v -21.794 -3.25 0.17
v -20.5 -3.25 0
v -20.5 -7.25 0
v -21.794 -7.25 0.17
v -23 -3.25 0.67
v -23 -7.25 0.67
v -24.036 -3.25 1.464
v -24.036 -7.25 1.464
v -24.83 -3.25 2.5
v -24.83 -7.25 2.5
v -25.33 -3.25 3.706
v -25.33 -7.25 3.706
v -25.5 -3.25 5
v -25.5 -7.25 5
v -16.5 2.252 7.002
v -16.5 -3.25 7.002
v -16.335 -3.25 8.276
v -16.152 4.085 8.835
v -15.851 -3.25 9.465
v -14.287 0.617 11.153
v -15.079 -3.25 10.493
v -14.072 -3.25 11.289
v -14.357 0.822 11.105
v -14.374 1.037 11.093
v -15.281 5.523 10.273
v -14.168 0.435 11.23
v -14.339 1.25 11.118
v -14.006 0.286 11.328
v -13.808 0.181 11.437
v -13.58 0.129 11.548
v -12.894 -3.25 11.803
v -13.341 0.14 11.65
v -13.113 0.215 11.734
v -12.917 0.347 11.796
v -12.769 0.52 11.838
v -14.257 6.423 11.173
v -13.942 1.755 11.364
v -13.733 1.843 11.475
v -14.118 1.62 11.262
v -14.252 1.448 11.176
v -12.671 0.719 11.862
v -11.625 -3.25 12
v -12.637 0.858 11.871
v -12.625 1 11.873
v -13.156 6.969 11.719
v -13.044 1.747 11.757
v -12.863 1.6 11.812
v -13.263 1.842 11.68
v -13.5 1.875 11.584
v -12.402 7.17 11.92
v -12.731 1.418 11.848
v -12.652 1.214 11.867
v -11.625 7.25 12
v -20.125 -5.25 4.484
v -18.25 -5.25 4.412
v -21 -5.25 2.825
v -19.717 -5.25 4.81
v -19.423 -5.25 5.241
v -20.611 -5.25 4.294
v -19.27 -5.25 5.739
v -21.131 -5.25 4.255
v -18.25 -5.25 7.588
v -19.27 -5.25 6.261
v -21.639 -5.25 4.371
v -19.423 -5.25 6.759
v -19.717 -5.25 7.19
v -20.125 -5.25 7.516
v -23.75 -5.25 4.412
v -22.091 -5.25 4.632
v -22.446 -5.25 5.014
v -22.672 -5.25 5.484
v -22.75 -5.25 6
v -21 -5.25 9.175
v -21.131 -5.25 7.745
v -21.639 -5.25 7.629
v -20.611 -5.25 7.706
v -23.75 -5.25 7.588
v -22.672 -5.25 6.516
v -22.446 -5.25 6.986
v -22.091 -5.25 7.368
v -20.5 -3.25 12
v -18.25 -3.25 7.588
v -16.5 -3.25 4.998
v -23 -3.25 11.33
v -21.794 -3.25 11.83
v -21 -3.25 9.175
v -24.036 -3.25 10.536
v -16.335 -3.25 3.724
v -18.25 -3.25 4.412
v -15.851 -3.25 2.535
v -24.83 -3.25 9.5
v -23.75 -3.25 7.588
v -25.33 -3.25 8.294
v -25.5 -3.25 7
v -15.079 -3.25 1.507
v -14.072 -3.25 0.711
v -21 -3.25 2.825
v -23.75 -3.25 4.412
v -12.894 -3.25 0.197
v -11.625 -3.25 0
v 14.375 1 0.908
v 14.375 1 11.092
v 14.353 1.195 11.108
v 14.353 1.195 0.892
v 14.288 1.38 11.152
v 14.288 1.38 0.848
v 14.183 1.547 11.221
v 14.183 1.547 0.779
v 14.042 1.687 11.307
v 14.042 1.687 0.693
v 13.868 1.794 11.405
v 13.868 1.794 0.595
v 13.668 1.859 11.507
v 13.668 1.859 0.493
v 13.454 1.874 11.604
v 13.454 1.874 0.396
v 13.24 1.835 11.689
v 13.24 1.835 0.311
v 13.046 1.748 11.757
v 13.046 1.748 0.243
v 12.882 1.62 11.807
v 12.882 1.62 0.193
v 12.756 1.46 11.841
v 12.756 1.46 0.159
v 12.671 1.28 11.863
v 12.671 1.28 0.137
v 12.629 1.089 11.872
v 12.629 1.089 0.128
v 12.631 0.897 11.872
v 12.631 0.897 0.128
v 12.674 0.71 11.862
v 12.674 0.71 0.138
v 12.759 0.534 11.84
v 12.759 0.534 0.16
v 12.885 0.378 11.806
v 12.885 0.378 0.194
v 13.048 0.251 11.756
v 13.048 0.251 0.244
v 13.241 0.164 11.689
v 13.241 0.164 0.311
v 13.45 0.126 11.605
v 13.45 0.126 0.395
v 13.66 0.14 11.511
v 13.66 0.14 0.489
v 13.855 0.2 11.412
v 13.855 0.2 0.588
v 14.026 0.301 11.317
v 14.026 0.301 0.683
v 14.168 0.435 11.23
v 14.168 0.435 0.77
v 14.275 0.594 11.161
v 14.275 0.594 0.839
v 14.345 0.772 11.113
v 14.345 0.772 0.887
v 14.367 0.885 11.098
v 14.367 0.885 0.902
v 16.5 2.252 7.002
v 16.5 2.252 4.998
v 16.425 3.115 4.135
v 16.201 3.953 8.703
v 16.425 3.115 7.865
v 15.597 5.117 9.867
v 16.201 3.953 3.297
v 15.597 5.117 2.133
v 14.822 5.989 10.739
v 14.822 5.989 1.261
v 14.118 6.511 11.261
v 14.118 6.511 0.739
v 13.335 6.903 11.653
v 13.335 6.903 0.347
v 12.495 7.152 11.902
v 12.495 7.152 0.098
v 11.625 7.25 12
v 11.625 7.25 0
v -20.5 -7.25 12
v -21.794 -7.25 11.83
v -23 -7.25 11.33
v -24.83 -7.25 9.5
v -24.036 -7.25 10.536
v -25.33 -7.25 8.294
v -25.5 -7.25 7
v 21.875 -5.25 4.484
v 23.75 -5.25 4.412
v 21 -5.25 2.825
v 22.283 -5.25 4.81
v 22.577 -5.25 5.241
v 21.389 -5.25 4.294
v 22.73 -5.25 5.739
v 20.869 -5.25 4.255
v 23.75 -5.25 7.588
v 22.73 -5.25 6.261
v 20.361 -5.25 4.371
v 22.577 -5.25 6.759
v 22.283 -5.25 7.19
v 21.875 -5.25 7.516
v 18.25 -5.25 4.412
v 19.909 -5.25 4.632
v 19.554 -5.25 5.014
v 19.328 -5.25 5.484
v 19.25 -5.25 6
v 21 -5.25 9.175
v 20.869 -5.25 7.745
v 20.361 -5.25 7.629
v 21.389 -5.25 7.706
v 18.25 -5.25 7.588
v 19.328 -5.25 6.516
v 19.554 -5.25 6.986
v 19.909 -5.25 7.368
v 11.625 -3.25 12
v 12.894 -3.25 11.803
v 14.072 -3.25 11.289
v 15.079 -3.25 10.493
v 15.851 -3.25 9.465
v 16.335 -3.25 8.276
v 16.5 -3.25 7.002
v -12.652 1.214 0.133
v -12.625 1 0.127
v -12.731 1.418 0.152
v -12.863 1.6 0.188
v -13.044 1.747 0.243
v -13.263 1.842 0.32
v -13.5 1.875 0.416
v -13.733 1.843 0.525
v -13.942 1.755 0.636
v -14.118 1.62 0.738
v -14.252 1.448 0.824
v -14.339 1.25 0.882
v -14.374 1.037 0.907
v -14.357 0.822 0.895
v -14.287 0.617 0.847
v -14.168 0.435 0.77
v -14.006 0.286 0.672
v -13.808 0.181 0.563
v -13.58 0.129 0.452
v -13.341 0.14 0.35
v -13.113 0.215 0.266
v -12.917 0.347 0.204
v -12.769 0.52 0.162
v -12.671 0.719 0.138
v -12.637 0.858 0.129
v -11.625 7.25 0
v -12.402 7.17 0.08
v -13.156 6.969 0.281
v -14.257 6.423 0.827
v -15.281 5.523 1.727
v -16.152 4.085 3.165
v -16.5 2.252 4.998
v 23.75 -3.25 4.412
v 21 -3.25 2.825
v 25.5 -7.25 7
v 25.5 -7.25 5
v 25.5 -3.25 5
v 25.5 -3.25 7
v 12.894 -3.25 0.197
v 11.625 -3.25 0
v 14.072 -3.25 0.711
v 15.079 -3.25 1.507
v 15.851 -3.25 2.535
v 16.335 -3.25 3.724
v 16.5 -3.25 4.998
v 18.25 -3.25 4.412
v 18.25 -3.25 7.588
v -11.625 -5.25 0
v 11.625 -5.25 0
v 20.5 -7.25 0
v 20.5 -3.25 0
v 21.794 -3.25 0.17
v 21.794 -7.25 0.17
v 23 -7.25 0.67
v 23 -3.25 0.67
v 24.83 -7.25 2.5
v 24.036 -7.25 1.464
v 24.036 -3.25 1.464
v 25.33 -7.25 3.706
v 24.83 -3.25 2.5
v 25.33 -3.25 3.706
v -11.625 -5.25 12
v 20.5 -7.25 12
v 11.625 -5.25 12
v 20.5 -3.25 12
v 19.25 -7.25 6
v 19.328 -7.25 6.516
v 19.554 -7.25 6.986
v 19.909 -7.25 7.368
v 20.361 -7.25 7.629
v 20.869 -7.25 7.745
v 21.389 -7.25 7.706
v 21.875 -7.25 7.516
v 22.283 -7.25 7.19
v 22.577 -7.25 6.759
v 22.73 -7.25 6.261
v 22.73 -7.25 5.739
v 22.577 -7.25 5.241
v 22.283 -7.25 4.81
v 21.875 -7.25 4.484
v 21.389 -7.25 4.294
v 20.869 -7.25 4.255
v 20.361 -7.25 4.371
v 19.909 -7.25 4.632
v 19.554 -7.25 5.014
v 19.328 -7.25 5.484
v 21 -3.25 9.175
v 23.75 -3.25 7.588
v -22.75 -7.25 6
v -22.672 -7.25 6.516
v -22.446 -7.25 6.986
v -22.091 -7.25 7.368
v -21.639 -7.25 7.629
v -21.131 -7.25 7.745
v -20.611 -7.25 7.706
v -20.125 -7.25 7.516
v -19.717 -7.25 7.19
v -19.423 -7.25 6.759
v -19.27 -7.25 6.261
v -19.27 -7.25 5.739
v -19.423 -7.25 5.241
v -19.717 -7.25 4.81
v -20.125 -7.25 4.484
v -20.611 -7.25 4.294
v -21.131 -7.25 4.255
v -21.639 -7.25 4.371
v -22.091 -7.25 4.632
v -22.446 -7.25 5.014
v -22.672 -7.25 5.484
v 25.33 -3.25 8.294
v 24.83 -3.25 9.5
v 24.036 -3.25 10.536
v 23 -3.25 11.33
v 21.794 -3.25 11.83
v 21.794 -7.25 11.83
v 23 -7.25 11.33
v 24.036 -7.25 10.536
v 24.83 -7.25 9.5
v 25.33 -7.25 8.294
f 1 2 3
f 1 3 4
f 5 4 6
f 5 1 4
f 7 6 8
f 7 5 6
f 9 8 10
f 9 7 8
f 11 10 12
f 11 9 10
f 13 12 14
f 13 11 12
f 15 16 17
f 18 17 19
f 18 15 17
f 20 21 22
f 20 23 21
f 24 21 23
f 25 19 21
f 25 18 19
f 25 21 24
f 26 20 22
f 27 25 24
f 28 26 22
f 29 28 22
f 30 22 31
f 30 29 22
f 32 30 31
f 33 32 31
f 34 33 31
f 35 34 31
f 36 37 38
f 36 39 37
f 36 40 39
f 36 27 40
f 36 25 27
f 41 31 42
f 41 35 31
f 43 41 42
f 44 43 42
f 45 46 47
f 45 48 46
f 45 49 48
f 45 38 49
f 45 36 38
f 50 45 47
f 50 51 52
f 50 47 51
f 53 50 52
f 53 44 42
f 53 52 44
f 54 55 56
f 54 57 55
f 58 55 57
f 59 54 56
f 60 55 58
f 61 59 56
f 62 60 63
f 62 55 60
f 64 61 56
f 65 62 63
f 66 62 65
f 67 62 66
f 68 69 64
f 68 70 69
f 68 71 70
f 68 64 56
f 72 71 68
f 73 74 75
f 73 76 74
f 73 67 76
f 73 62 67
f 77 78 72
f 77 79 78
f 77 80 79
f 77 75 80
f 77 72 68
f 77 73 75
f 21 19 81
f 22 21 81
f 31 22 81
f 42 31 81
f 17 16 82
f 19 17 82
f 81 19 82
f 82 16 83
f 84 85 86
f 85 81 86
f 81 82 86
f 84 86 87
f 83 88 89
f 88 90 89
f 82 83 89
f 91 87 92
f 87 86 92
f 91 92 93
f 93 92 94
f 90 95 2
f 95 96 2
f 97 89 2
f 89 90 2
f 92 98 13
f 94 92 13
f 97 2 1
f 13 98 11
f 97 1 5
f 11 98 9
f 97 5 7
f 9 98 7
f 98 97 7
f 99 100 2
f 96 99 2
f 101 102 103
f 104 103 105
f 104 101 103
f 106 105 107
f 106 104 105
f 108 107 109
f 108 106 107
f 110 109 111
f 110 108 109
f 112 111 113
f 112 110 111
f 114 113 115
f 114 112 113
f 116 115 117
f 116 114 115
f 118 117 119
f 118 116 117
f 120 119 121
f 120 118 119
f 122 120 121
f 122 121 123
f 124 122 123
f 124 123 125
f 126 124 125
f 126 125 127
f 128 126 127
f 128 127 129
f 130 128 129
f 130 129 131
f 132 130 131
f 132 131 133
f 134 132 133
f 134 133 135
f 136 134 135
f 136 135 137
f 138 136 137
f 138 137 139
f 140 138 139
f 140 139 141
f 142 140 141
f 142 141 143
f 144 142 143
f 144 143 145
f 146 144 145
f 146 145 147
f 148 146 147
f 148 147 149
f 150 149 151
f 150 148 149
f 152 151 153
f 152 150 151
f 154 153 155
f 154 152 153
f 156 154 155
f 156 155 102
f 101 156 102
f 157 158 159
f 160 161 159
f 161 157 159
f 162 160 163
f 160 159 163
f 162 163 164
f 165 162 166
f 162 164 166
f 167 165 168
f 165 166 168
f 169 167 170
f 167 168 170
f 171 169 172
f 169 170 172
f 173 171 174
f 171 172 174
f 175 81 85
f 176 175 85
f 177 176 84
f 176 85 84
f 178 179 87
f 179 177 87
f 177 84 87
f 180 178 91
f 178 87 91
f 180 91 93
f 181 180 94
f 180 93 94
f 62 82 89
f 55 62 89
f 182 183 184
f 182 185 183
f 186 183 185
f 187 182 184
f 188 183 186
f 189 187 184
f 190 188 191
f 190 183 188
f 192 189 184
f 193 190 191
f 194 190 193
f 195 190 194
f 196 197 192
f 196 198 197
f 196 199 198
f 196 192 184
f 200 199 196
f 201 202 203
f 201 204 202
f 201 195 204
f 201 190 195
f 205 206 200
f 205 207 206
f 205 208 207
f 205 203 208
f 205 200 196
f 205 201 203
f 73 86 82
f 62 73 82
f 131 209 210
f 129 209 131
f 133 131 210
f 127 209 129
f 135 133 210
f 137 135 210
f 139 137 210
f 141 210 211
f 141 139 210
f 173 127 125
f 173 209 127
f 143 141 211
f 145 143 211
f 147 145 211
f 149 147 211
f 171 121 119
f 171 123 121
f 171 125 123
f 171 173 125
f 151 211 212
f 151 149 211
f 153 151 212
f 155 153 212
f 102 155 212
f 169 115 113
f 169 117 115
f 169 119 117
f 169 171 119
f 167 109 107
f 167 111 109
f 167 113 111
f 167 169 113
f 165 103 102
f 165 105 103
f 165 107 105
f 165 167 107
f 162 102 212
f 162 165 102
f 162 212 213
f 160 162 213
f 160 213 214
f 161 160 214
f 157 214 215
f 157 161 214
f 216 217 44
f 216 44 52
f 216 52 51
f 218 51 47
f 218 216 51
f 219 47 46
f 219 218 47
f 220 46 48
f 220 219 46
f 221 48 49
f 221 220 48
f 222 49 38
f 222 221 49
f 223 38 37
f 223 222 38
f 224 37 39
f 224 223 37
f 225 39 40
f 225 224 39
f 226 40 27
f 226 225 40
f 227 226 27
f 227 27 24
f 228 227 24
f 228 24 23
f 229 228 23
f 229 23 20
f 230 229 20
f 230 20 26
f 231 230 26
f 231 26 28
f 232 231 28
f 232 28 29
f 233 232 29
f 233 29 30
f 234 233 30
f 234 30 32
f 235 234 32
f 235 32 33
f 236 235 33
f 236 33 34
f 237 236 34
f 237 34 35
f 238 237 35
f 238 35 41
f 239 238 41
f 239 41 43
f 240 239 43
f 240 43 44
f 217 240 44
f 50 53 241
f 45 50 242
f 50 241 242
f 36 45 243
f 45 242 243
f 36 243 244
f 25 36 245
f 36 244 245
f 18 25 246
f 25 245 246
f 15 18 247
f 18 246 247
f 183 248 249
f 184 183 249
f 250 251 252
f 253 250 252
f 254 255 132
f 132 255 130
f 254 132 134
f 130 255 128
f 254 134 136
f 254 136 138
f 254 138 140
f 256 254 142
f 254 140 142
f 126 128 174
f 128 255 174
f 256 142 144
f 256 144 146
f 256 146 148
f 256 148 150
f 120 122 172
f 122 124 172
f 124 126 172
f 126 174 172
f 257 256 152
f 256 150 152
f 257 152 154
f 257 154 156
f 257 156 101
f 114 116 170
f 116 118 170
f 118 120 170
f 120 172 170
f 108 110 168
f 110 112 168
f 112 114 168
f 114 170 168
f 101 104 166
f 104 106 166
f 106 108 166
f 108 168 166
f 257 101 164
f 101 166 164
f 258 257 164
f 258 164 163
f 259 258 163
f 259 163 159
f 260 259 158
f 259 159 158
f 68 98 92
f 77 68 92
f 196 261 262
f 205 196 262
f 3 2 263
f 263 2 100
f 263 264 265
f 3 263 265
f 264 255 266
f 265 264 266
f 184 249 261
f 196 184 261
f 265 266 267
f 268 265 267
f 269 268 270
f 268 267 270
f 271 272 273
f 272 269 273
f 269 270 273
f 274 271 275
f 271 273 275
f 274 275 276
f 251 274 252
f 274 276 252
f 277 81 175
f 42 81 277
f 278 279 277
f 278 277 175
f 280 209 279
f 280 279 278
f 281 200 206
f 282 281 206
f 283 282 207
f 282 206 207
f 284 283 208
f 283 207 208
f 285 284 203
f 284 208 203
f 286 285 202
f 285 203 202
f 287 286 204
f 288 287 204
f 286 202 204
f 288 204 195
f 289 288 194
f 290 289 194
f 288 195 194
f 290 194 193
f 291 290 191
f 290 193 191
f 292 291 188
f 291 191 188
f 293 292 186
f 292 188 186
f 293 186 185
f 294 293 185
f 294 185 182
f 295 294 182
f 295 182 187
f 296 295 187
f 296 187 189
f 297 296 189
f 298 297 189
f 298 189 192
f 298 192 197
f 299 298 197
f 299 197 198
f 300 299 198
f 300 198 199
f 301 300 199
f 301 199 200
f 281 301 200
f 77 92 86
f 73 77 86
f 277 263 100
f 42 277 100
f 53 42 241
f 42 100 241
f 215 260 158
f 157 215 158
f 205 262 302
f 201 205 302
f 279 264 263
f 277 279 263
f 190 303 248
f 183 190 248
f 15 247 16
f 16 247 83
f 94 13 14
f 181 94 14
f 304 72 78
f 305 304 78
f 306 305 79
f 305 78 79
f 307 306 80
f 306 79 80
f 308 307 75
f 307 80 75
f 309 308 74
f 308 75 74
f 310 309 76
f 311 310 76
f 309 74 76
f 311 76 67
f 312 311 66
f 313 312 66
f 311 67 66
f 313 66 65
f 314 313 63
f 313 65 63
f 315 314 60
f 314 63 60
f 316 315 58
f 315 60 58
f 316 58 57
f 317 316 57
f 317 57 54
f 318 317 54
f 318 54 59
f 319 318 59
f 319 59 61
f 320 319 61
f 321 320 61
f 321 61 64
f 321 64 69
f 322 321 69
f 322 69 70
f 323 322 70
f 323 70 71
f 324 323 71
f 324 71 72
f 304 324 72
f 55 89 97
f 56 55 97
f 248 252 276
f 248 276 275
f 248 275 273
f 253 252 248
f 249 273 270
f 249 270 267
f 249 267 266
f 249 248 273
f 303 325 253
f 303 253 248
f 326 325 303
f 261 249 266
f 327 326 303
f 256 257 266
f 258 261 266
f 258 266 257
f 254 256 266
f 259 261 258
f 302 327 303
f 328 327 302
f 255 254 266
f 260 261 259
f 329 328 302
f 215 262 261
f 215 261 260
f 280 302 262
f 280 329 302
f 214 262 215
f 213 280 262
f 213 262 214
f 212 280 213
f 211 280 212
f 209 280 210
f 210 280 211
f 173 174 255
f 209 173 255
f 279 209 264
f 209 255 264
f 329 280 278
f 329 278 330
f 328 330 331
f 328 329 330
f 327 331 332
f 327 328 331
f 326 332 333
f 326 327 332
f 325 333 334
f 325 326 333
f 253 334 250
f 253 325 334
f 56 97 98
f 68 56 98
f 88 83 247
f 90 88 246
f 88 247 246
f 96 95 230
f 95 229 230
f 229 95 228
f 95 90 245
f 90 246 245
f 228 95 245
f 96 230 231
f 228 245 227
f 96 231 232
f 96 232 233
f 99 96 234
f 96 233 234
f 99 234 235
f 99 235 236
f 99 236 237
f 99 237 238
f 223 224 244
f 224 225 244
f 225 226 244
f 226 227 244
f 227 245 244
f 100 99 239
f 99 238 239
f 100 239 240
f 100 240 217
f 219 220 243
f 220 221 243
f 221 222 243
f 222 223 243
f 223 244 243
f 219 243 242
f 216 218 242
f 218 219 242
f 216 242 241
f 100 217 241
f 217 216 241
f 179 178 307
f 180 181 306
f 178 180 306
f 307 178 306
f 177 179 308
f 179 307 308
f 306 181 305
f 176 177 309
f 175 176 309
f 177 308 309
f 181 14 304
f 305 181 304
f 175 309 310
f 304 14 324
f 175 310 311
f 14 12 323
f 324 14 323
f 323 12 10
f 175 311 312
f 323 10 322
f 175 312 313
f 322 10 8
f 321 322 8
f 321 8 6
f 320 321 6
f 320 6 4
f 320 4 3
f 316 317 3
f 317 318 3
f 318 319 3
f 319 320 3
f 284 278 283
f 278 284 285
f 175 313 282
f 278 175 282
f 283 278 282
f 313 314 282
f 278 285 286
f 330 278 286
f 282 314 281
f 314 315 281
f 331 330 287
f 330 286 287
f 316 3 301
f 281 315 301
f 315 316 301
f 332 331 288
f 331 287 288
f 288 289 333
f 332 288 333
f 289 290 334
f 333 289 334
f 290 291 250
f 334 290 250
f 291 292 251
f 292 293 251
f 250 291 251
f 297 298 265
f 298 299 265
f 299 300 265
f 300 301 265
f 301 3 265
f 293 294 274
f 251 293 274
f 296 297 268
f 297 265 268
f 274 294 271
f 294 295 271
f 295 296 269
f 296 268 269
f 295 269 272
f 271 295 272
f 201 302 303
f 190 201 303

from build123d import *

# Parameters (mm, degrees)
F0_R        = 0.875
F1_DEPTH    = 12
F2_R        = 1.75
F3_DEPTH    = 25
F4_DEPTH    = 2
F5_T1_DEPTH = 36.9921862789
F5_T3_DEPTH = 29
F5_T5_DEPTH = 22.9960931395


# Not quite as in the source:
# - a fillet or chamfer that OpenCascade refuses, or shapes differently, is made with other operations: its cross-section is extruded or revolved along the edge and cut away or added


with BuildPart() as f1:
    # F0 (on Top) → F1 (new body)
    with BuildSketch(Plane.XY):
        Polygon((-11.625, 7.25), (-16.5, 7.25), (-16.5, -3.25), (-16.5, -5.25), (-11.625, -5.25), align=None)
        with Locations((-13.5, 1)):
            Circle(F0_R, mode=Mode.SUBTRACT)
        Polygon((-16.5, -5.25), (-16.5, -3.25), (-25.5, -3.25), (-25.5, -7.25), (-16.5, -7.25), align=None)
        Polygon((11.625, -5.25), (-11.625, -5.25), (-16.5, -5.25), (-16.5, -7.25), (16.5, -7.25), (16.5, -5.25), align=None)
        Polygon((25.5, -3.25), (16.5, -3.25), (16.5, -5.25), (16.5, -7.25), (25.5, -7.25), align=None)
        Polygon((16.5, 7.25), (11.625, 7.25), (11.625, -5.25), (16.5, -5.25), (16.5, -3.25), align=None)
        with Locations((13.5, 1)):
            Circle(F0_R, mode=Mode.SUBTRACT)
    extrude(amount=F1_DEPTH)

    # F2 (on face) → F3 (cut)
    with BuildSketch(Plane(origin=(0, -3.25, 0), x_dir=(-1, 0, 0), z_dir=(0, 1, 0))):
        with Locations((-21, 6)):
            Circle(F2_R)
        with Locations((21, 6)):
            Circle(F2_R)
    extrude(amount=-F3_DEPTH, mode=Mode.SUBTRACT)

    # F2 (on face) → F4 (cut)
    with BuildSketch(Plane(origin=(0, -3.25, 0), x_dir=(-1, 0, 0), z_dir=(0, 1, 0))):
        Polygon((-23.75, 7.5877132403), (-23.75, 4.4122867597), (-21, 2.8245735195), (-18.25, 4.4122867597), (-18.25, 7.5877132403), (-21, 9.1754264805), align=None)
        with Locations((-21, 6)):
            Circle(F2_R, mode=Mode.SUBTRACT)
        Polygon((23.75, 4.4122867597), (23.75, 7.5877132403), (21, 9.1754264805), (18.25, 7.5877132403), (18.25, 4.4122867597), (21, 2.8245735195), align=None)
        with Locations((21, 6)):
            Circle(F2_R, mode=Mode.SUBTRACT)
    extrude(amount=-F4_DEPTH, mode=Mode.SUBTRACT)

    # F5: fillet of radius 5 on 10 edges, made by hand

    # F5_s2 → F5_t1 (cut)
    with BuildSketch(Plane.XY.offset(-12.4960931395)):
        with BuildLine():
            ThreePointArc((-11.625, 7.25), (-15.0794552658, 5.7426227552), (-16.5, 2.2515627442))
            Line((-16.5, 2.2515627442), (-16.5, 7.25))
            Line((-16.5, 7.25), (-11.625, 7.25))
        make_face()
        with BuildLine():
            ThreePointArc((16.5, 2.2515627442), (15.0794552658, 5.7426227552), (11.625, 7.25))
            Line((11.625, 7.25), (16.5, 7.25))
            Line((16.5, 7.25), (16.5, 2.2515627442))
        make_face()
    extrude(amount=F5_T1_DEPTH, mode=Mode.SUBTRACT)

    # F5_s4 → F5_t3 (cut)
    with BuildSketch(Plane.XZ.offset(-9.25)):
        with BuildLine():
            ThreePointArc((20.5, 12), (24.0355339059, 10.5355339059), (25.5, 7))
            Line((25.5, 7), (25.5, 12))
            Line((25.5, 12), (20.5, 12))
        make_face()
        with BuildLine():
            ThreePointArc((20.5, 0), (24.0355339059, 1.4644660941), (25.5, 5))
            Line((25.5, 5), (25.5, 0))
            Line((25.5, 0), (20.5, 0))
        make_face()
        with BuildLine():
            ThreePointArc((-20.5, 0), (-24.0355339059, 1.4644660941), (-25.5, 5))
            Line((-25.5, 5), (-25.5, 0))
            Line((-25.5, 0), (-20.5, 0))
        make_face()
        with BuildLine():
            ThreePointArc((-20.5, 12), (-24.0355339059, 10.5355339059), (-25.5, 7))
            Line((-25.5, 7), (-25.5, 12))
            Line((-25.5, 12), (-20.5, 12))
        make_face()
    extrude(amount=F5_T3_DEPTH, mode=Mode.SUBTRACT)

    # F5_s6 → F5_t5 (cut)
    with BuildSketch(Plane.XZ.offset(-19.7460931395)):
        with BuildLine():
            ThreePointArc((11.625, 0), (15.0794552658, 1.5073772448), (16.5, 4.9984372558))
            Line((16.5, 4.9984372558), (16.5, 0))
            Line((16.5, 0), (11.625, 0))
        make_face()
        with BuildLine():
            ThreePointArc((11.625, 12), (15.0794552658, 10.4926227552), (16.5, 7.0015627442))
            Line((16.5, 7.0015627442), (16.5, 12))
            Line((16.5, 12), (11.625, 12))
        make_face()
        with BuildLine():
            ThreePointArc((-16.5, 7.0015627442), (-15.0794552658, 10.4926227552), (-11.625, 12))
            Line((-11.625, 12), (-16.5, 12))
            Line((-16.5, 12), (-16.5, 7.0015627442))
        make_face()
        with BuildLine():
            ThreePointArc((-16.5, 4.9984372558), (-15.0794552658, 1.5073772448), (-11.625, 0))
            Line((-11.625, 0), (-16.5, 0))
            Line((-16.5, 0), (-16.5, 4.9984372558))
        make_face()
    extrude(amount=F5_T5_DEPTH, mode=Mode.SUBTRACT)


solid = f1.part
